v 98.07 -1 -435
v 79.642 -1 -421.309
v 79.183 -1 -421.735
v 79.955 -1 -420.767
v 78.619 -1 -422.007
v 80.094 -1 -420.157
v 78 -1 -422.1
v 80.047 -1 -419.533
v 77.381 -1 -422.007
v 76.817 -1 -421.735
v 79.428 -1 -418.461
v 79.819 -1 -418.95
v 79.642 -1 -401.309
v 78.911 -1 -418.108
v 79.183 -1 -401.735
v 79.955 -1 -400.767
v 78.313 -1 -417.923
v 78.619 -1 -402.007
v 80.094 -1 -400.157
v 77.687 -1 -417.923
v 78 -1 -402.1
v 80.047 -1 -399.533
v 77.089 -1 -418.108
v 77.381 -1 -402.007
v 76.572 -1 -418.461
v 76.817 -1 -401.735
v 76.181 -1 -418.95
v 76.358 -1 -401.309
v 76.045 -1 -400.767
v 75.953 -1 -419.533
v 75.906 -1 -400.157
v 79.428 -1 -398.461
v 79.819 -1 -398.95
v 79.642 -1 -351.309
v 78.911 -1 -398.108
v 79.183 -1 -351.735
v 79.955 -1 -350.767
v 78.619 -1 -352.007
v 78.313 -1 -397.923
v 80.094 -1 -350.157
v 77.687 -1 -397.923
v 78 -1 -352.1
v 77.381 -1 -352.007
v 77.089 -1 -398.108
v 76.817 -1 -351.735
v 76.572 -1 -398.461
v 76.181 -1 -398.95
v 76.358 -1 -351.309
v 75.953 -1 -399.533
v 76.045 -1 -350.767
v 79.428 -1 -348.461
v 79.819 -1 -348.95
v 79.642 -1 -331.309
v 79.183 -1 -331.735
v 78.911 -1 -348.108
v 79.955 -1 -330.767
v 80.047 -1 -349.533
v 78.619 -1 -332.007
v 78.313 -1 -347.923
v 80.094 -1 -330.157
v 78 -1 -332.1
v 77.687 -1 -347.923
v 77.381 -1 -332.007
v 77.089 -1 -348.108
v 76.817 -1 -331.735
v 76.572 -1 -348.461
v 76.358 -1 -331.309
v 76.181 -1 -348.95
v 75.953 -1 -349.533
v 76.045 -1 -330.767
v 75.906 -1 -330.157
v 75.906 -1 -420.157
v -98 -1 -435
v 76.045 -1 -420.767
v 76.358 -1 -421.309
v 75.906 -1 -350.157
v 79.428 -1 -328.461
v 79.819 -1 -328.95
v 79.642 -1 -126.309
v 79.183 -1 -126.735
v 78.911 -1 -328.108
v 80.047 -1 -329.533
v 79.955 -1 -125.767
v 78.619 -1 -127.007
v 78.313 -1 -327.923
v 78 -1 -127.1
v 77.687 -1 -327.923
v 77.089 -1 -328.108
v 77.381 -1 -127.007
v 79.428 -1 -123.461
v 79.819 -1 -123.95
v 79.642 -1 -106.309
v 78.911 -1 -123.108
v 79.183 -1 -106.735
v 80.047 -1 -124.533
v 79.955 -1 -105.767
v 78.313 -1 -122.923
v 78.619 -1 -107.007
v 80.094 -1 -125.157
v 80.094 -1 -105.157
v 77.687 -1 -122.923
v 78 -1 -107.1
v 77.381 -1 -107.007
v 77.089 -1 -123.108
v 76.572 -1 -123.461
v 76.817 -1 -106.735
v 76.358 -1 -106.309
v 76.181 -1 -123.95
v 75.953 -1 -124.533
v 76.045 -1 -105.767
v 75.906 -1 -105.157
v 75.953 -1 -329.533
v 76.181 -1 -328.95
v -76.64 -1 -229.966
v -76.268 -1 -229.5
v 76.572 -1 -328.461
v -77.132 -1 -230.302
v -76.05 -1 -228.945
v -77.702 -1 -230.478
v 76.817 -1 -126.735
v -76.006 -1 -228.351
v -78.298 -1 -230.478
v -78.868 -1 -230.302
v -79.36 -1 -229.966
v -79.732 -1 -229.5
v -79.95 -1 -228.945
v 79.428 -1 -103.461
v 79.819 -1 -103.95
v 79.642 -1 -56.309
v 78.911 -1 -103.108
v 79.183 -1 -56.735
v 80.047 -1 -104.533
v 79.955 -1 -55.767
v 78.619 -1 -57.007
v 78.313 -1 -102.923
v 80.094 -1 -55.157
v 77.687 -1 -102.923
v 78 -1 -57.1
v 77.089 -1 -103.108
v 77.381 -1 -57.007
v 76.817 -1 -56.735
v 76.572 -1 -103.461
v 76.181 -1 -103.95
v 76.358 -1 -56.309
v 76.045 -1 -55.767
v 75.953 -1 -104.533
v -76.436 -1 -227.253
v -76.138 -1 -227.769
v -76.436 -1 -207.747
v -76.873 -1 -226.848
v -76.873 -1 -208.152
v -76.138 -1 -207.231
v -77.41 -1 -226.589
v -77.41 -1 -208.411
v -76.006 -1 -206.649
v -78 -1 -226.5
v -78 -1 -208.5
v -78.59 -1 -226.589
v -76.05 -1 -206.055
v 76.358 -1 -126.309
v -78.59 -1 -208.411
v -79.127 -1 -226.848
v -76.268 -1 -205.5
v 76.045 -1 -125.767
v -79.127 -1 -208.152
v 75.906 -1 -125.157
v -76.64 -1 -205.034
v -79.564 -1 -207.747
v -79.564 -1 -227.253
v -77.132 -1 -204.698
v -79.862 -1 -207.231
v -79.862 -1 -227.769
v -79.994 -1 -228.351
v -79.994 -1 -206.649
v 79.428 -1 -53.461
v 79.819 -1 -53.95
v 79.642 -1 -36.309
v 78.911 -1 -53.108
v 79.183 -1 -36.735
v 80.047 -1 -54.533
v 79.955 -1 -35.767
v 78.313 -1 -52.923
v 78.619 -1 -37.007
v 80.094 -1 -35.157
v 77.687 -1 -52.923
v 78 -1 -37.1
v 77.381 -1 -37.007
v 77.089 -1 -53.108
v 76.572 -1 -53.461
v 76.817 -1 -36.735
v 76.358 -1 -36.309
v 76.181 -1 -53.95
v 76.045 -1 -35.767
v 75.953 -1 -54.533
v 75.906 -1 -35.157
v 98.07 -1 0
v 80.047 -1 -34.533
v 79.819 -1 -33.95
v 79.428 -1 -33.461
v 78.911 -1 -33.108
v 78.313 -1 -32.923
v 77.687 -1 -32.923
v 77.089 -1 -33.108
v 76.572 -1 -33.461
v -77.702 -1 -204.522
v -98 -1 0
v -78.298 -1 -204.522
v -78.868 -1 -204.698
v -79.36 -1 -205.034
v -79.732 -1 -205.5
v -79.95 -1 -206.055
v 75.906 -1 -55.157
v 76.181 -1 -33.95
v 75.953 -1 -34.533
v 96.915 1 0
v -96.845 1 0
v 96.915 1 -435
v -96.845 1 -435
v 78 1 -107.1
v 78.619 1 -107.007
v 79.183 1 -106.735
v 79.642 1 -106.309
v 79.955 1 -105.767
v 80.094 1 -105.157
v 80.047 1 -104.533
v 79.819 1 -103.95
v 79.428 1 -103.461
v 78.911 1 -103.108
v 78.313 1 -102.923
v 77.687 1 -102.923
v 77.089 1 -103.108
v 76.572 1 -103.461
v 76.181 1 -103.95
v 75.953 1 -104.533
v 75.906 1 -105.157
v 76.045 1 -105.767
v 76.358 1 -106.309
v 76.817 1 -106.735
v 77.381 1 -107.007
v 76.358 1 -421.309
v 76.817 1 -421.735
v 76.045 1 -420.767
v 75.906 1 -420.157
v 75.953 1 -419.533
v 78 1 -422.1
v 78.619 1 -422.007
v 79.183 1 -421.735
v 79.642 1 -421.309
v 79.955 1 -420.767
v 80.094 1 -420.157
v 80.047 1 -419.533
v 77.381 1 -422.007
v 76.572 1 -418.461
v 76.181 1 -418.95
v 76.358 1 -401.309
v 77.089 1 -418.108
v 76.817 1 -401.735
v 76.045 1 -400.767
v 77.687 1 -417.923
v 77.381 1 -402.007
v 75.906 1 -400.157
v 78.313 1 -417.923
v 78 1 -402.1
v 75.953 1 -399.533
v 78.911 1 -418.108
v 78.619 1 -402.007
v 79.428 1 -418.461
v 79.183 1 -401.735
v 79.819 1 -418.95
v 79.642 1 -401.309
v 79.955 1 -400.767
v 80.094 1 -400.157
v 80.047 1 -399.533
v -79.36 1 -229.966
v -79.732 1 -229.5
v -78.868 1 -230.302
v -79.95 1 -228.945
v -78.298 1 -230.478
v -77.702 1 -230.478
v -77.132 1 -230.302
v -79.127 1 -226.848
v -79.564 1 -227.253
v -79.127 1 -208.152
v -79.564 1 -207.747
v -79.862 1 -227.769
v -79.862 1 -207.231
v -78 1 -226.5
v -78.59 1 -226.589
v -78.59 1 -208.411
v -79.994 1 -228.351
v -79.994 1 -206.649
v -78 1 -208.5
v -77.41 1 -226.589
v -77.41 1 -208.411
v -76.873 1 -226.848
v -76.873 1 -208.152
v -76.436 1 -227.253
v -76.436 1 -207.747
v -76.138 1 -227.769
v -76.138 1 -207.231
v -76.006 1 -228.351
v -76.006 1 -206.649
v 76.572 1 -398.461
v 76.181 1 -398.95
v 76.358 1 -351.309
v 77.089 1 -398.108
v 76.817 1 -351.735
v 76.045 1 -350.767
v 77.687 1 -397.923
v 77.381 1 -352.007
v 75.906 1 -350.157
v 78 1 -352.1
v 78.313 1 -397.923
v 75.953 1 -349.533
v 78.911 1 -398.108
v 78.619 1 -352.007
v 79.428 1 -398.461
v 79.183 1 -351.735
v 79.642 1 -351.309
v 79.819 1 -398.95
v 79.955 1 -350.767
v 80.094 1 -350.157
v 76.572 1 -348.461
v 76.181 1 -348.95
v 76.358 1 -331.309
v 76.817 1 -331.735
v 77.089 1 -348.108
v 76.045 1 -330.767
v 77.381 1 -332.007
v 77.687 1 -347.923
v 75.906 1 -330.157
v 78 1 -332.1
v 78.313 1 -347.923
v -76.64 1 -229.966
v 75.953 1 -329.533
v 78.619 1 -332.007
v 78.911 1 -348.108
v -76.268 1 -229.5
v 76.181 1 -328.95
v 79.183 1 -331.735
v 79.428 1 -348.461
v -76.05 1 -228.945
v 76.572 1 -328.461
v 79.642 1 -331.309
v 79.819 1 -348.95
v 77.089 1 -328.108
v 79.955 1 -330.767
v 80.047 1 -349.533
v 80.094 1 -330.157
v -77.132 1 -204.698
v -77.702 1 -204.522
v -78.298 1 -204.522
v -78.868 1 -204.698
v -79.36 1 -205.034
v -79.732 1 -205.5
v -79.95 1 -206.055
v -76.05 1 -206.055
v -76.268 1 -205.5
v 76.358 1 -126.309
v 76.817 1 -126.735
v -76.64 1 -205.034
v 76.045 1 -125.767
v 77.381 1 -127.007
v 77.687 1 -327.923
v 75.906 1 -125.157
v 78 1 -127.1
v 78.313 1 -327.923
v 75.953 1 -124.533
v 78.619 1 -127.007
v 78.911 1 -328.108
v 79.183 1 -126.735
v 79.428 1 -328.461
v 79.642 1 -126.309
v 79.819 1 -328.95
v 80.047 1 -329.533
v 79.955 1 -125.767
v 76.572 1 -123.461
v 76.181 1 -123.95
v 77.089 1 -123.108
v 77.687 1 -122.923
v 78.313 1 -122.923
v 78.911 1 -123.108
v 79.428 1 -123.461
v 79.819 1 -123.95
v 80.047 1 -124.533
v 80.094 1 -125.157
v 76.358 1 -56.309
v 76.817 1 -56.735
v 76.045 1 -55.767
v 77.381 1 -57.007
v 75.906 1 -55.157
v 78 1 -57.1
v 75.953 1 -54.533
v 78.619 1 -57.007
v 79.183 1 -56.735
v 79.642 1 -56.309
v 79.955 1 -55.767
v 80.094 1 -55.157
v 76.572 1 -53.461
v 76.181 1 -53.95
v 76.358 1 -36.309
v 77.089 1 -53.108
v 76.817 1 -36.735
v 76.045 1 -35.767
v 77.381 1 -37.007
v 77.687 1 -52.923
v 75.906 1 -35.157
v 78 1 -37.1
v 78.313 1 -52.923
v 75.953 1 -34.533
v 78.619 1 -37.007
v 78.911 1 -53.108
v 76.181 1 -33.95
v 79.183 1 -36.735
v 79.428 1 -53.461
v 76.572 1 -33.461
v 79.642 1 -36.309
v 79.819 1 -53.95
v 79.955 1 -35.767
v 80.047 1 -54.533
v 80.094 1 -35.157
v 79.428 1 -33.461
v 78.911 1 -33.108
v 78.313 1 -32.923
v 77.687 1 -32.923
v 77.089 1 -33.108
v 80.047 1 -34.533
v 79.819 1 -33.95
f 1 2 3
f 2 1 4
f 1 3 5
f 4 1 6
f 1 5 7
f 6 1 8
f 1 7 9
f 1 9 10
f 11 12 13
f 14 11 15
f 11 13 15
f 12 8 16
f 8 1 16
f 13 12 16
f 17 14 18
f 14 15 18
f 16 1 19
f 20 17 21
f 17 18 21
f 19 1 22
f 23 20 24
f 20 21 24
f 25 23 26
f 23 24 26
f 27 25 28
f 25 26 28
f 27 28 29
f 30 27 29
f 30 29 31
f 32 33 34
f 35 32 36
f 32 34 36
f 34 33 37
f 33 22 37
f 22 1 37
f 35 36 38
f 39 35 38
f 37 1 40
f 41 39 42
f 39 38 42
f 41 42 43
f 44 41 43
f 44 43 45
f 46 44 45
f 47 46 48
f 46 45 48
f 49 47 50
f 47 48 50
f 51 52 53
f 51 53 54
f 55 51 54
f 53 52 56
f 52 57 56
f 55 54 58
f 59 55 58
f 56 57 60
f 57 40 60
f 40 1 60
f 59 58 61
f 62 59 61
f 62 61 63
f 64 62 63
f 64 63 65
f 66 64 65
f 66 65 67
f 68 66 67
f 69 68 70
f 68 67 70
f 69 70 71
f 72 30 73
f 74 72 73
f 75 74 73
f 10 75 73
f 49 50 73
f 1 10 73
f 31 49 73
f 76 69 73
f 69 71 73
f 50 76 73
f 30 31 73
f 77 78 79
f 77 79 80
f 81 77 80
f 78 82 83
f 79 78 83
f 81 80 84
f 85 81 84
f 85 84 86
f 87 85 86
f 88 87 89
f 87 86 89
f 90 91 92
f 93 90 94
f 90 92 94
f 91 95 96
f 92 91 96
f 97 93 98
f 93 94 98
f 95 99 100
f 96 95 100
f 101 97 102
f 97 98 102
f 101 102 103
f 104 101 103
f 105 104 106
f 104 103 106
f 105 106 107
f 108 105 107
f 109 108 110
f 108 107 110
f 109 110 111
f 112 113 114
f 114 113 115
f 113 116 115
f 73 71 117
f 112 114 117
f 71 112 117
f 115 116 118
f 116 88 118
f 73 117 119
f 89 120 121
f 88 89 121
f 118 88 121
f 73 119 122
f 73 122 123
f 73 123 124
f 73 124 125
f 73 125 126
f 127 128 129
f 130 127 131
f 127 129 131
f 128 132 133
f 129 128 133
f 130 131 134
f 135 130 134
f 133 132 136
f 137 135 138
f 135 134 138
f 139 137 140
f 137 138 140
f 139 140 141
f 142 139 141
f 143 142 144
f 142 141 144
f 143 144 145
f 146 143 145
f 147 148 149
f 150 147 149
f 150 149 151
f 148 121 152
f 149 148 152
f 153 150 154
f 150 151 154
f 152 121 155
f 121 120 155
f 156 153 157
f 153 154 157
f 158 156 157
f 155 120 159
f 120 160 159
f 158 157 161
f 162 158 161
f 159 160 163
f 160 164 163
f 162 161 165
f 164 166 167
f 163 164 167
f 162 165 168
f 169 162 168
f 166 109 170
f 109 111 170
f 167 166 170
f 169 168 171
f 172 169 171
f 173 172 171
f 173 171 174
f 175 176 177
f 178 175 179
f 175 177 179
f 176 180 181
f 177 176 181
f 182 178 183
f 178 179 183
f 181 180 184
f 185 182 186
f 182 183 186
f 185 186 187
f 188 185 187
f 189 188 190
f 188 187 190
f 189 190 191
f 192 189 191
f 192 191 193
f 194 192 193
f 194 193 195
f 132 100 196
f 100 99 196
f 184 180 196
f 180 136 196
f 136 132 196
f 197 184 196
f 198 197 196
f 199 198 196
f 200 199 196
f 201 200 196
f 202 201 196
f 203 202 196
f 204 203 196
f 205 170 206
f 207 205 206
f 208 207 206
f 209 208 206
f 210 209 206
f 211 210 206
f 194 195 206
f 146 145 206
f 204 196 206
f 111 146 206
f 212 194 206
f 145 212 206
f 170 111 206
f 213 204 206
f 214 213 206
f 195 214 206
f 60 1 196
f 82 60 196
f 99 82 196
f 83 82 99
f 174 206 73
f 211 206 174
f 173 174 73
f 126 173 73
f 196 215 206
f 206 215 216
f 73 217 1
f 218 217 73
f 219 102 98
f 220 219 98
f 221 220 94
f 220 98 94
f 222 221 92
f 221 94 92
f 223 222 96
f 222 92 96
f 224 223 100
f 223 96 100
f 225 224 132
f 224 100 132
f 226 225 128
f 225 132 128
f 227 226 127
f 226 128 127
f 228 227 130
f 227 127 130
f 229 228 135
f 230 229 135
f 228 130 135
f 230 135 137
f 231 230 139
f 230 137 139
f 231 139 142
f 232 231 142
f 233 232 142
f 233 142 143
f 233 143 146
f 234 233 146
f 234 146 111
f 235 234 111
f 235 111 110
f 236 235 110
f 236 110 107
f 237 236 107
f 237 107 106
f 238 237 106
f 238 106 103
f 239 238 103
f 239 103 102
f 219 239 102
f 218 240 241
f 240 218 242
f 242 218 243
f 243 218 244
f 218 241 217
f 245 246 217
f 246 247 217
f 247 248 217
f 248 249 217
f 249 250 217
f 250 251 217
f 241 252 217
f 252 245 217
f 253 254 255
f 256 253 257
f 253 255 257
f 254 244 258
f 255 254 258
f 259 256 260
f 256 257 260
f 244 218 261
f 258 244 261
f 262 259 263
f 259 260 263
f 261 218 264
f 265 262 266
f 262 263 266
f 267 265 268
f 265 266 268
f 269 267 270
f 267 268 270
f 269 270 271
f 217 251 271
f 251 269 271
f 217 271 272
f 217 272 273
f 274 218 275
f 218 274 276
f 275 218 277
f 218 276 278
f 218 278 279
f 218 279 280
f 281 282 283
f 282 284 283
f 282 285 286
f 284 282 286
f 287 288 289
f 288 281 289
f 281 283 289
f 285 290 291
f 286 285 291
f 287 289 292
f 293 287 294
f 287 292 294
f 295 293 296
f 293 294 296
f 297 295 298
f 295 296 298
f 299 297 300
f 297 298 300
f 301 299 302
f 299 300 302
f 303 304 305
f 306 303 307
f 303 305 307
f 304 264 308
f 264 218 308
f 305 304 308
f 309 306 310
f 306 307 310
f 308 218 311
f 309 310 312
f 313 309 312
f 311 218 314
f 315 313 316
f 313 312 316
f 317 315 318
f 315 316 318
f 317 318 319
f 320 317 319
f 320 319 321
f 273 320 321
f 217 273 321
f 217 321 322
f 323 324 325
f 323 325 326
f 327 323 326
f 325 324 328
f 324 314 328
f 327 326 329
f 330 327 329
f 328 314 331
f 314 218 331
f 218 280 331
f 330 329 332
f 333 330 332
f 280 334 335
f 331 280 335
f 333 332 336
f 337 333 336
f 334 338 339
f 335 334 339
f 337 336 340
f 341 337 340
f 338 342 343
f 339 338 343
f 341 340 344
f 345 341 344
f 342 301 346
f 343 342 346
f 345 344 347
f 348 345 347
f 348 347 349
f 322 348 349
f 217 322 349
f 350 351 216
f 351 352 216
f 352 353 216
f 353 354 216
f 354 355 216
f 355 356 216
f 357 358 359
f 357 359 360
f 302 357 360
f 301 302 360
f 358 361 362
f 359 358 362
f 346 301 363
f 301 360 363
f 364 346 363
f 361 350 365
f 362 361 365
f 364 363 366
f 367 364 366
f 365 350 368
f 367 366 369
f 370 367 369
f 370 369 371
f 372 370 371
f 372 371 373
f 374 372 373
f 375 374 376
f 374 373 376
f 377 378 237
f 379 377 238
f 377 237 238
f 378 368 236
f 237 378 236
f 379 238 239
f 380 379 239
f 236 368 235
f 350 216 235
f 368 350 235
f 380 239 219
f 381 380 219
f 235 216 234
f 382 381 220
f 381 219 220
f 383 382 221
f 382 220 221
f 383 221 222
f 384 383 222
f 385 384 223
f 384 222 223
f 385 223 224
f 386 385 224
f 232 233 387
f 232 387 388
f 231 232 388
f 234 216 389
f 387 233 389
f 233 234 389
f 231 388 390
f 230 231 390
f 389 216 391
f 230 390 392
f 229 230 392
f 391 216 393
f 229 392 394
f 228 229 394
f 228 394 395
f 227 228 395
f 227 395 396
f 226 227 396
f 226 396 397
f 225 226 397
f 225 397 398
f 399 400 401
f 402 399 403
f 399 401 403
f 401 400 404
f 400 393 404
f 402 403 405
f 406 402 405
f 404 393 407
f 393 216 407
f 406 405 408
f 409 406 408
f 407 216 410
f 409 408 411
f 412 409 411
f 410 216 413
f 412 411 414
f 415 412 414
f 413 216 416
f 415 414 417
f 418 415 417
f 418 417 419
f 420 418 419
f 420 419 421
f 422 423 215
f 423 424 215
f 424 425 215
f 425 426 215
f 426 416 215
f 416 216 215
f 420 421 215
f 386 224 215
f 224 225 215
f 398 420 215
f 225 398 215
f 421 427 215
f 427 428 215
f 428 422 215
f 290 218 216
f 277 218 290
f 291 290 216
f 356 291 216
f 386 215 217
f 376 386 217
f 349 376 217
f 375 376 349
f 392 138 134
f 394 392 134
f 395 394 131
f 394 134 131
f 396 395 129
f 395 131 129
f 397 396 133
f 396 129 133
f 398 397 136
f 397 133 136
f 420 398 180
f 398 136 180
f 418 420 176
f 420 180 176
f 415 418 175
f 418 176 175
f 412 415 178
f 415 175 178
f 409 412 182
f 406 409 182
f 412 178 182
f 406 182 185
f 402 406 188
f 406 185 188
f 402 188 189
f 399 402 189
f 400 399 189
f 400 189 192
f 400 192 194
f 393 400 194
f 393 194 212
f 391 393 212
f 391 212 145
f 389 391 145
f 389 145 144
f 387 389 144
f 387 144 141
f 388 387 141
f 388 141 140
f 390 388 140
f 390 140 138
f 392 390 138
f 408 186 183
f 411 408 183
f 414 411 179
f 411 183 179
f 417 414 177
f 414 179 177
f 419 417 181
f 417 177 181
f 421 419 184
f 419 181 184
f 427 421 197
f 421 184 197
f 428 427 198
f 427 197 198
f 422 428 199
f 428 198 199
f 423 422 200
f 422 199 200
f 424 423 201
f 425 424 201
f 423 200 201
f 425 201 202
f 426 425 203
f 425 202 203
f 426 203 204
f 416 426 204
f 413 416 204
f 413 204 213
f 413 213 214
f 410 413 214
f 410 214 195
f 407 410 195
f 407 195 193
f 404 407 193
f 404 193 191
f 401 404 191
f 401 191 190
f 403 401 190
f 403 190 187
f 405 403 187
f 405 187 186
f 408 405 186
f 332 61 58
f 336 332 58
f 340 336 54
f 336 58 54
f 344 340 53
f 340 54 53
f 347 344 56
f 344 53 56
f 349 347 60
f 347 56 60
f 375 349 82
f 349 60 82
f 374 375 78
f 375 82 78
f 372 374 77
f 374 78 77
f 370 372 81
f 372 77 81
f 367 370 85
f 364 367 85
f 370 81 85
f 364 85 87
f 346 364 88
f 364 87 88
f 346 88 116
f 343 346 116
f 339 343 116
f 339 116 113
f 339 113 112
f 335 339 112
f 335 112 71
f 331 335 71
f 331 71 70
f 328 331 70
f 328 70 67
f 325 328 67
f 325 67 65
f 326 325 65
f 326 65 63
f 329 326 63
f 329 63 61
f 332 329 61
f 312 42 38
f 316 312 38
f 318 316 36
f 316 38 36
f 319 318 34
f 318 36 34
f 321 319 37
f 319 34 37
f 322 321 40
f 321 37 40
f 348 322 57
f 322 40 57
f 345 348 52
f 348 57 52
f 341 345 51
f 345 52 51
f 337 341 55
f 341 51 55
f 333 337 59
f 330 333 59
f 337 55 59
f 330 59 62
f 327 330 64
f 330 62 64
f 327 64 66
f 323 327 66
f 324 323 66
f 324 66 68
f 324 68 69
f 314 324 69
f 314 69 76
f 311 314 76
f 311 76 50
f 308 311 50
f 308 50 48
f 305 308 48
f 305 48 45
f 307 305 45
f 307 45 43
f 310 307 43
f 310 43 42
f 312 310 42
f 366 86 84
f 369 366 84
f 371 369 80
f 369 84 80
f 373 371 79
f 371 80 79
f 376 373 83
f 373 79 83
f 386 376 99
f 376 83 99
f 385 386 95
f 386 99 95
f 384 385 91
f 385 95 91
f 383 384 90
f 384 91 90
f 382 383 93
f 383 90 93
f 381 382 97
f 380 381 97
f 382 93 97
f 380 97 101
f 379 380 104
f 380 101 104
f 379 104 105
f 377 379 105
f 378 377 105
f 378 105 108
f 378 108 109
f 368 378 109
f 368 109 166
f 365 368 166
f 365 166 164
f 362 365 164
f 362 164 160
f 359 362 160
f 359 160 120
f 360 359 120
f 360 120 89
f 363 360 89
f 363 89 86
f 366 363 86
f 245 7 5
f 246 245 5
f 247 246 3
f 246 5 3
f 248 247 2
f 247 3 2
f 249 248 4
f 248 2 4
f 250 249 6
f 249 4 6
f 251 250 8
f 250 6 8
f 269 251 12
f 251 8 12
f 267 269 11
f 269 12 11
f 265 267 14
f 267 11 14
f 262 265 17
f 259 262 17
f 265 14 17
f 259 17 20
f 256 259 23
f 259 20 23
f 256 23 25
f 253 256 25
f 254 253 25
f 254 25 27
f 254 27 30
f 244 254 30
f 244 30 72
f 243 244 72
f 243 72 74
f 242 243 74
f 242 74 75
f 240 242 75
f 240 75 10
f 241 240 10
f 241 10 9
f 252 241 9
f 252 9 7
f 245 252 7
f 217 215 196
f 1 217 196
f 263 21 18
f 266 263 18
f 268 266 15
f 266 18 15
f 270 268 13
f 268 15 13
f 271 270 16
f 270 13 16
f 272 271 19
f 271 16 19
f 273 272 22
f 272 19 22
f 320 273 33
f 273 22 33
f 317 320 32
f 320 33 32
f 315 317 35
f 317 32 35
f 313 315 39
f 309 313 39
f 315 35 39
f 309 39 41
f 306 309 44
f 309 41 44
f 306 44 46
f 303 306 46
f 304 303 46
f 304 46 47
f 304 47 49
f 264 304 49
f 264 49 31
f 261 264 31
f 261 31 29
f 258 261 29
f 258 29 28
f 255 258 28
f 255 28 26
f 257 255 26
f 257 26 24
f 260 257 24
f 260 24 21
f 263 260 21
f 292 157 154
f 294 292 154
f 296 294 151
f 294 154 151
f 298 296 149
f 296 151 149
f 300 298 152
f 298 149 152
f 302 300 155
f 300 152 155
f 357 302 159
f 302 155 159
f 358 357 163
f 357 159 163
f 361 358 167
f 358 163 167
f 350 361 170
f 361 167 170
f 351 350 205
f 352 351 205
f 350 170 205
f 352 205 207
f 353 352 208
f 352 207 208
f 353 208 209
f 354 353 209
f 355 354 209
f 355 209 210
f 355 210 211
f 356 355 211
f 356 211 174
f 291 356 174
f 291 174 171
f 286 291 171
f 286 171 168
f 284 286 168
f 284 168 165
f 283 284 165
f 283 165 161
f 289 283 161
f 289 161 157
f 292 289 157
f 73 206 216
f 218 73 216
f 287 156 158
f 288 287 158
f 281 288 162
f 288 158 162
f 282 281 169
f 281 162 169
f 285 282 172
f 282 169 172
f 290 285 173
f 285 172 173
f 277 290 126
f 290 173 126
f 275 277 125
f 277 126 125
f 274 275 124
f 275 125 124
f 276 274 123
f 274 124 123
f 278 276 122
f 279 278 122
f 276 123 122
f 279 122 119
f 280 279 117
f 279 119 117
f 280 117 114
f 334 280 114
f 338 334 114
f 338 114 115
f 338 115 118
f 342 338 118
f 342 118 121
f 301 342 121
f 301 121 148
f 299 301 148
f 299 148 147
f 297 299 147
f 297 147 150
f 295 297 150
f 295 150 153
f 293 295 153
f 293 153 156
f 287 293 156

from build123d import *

# Parameters (mm, degrees)
EXTRUDE_1_DEPTH     = 435
SKETCH_3_R          = 2.1
CUT_EXTRUDE_1_DEPTH = 446.922330569
SKETCH_6_R          = 2
CUT_EXTRUDE_2_DEPTH = 446.922330569


with BuildPart() as part:
    # 草图2 → 凸台-拉伸1 (new body)
    with BuildSketch(Plane.XY):
        Polygon((-98, -1), (-96.845299462, 1), (96.915299462, 1), (98.07, -1), align=None)
    extrude(amount=-EXTRUDE_1_DEPTH)

    # 草图3 → 切除-拉伸1 (cut, through all)
    with BuildSketch(Plane(origin=(0, -1, 0), x_dir=(-1, 0, 0), z_dir=(0, -1, 0))):
        with Locations(Location((-78, 35, 0), (0, 0, 90))):
            Circle(SKETCH_3_R)
        with Locations(Location((-78, 55, 0), (0, 0, 90))):
            Circle(SKETCH_3_R)
        with Locations(Location((-78, 105, 0), (0, 0, 90))):
            Circle(SKETCH_3_R)
        with Locations(Location((-78, 125, 0), (0, 0, 90))):
            Circle(SKETCH_3_R)
        with Locations(Location((-78, 330, 0), (0, 0, 90))):
            Circle(SKETCH_3_R)
        with Locations(Location((-78, 350, 0), (0, 0, 90))):
            Circle(SKETCH_3_R)
        with Locations(Location((-78, 400, 0), (0, 0, 90))):
            Circle(SKETCH_3_R)
        with Locations(Location((-78, 420, 0), (0, 0, 90))):
            Circle(SKETCH_3_R)
    extrude(amount=-CUT_EXTRUDE_1_DEPTH, mode=Mode.SUBTRACT)

    # 草图6 → 切除-拉伸2 (cut, through all)
    with BuildSketch(Plane(origin=(0, -1, 0), x_dir=(-1, 0, 0), z_dir=(0, -1, 0))):
        with Locations(Location((78, 206.5, 0), (0, 0, 90))):
            Circle(SKETCH_6_R)
        with Locations(Location((78, 228.5, 0), (0, 0, 270))):
            Circle(SKETCH_6_R)
    extrude(amount=-CUT_EXTRUDE_2_DEPTH, mode=Mode.SUBTRACT)


solid = part.part
